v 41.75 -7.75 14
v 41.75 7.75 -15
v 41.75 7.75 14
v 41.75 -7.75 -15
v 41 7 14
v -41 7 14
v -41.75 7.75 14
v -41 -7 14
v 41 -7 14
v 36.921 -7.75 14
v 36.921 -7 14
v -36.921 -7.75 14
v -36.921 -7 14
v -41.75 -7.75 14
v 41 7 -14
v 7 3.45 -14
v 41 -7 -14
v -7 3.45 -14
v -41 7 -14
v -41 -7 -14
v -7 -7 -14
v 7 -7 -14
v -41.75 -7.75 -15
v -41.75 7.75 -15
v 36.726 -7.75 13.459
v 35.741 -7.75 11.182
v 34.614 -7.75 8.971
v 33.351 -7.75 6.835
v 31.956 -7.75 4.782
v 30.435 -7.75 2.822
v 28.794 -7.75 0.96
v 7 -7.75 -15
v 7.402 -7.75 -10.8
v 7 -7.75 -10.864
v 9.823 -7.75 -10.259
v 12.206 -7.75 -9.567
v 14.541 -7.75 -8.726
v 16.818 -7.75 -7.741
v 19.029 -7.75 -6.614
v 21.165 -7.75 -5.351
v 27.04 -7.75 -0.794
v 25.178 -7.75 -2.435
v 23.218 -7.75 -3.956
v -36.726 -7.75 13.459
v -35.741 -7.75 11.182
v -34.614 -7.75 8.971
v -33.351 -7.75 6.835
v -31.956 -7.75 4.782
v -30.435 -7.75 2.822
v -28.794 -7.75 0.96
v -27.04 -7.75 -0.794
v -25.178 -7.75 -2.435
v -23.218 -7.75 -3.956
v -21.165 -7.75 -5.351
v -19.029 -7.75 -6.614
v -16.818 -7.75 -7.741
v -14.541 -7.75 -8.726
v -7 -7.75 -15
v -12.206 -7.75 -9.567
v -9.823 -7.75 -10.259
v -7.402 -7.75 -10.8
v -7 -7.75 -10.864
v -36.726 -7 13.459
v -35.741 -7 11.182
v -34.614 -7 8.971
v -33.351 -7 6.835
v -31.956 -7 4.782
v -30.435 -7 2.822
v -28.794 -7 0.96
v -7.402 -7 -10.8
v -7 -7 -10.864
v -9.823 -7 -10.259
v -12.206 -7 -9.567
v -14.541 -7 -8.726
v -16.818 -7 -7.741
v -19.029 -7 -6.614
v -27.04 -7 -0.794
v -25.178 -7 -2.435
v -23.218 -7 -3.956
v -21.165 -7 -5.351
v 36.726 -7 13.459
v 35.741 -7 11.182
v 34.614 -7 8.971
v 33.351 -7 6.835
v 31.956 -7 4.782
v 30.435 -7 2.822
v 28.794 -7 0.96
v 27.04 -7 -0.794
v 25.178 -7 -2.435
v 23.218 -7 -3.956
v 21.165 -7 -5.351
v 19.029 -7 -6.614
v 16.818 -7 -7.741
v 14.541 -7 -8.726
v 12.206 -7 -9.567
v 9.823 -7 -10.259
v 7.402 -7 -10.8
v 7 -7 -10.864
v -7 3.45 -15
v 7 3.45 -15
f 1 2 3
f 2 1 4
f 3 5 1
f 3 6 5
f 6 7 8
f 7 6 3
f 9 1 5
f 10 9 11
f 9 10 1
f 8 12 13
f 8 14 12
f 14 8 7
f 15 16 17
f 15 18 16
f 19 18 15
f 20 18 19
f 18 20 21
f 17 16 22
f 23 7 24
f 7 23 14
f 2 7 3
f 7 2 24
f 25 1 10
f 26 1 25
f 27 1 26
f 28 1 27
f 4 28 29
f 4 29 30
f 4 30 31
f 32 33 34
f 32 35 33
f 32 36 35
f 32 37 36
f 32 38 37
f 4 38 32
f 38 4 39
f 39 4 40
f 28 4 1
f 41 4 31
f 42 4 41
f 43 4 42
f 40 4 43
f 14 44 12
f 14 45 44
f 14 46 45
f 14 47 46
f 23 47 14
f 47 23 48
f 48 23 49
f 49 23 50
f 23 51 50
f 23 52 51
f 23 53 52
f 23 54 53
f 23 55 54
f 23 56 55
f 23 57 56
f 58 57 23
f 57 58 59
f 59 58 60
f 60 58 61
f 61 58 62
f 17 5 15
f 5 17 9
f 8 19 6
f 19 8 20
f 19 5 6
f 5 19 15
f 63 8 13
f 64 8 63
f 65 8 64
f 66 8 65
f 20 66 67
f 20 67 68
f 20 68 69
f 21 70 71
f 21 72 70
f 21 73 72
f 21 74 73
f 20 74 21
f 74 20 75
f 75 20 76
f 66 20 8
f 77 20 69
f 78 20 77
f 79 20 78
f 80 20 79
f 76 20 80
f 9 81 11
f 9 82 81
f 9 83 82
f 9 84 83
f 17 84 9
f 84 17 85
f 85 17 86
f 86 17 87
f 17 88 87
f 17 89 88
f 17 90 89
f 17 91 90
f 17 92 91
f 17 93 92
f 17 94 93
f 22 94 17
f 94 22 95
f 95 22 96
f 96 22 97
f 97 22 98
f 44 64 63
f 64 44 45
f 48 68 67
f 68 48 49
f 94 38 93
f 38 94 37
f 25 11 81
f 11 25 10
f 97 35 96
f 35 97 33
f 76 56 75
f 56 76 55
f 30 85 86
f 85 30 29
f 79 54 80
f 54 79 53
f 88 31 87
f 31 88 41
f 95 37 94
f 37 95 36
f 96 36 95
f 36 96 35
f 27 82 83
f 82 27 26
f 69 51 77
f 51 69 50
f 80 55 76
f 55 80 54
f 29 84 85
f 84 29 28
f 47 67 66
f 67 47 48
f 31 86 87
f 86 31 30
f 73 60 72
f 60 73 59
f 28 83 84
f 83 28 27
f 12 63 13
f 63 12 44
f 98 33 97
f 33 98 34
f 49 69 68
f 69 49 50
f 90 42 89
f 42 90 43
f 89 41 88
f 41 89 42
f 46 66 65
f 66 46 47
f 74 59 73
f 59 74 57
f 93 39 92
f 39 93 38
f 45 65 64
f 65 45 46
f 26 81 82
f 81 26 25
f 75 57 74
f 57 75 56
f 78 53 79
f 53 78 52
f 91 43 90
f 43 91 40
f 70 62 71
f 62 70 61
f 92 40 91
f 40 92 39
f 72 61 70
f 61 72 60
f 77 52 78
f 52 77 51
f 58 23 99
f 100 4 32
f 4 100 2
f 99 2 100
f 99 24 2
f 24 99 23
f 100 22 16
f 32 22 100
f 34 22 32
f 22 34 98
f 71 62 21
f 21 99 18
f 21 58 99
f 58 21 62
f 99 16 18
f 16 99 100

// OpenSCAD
 
  phonewidth = 82;
  phonedepth = 14;
  hight = 28;
  thickness = 1.5;
  basethickness = 1;
  chargercut = 14;
  sides = 100;
  
difference(){

union(){
 difference(){   
     
 difference(){
 cube ([phonewidth+thickness, phonedepth+thickness, hight], center = true);     
 cube ([phonewidth, phonedepth, hight+1], center = true);   
 }
 
 
 
 translate([0,0,phonewidth/2-hight/2+1])
 rotate ([90,0,0]) 
 linear_extrude (1000) 
 circle (r= phonewidth/2-thickness,$fn=sides);
 }
 
 translate([0,0,-hight/2-basethickness/2])
 cube ([phonewidth+thickness, phonedepth+thickness, basethickness], center = true);
 }
 
 
 translate([0,-phonedepth/5 - thickness,-hight/2+0.5])
 cube([chargercut,phonedepth+thickness,hight*2], center=true);
 }
 
